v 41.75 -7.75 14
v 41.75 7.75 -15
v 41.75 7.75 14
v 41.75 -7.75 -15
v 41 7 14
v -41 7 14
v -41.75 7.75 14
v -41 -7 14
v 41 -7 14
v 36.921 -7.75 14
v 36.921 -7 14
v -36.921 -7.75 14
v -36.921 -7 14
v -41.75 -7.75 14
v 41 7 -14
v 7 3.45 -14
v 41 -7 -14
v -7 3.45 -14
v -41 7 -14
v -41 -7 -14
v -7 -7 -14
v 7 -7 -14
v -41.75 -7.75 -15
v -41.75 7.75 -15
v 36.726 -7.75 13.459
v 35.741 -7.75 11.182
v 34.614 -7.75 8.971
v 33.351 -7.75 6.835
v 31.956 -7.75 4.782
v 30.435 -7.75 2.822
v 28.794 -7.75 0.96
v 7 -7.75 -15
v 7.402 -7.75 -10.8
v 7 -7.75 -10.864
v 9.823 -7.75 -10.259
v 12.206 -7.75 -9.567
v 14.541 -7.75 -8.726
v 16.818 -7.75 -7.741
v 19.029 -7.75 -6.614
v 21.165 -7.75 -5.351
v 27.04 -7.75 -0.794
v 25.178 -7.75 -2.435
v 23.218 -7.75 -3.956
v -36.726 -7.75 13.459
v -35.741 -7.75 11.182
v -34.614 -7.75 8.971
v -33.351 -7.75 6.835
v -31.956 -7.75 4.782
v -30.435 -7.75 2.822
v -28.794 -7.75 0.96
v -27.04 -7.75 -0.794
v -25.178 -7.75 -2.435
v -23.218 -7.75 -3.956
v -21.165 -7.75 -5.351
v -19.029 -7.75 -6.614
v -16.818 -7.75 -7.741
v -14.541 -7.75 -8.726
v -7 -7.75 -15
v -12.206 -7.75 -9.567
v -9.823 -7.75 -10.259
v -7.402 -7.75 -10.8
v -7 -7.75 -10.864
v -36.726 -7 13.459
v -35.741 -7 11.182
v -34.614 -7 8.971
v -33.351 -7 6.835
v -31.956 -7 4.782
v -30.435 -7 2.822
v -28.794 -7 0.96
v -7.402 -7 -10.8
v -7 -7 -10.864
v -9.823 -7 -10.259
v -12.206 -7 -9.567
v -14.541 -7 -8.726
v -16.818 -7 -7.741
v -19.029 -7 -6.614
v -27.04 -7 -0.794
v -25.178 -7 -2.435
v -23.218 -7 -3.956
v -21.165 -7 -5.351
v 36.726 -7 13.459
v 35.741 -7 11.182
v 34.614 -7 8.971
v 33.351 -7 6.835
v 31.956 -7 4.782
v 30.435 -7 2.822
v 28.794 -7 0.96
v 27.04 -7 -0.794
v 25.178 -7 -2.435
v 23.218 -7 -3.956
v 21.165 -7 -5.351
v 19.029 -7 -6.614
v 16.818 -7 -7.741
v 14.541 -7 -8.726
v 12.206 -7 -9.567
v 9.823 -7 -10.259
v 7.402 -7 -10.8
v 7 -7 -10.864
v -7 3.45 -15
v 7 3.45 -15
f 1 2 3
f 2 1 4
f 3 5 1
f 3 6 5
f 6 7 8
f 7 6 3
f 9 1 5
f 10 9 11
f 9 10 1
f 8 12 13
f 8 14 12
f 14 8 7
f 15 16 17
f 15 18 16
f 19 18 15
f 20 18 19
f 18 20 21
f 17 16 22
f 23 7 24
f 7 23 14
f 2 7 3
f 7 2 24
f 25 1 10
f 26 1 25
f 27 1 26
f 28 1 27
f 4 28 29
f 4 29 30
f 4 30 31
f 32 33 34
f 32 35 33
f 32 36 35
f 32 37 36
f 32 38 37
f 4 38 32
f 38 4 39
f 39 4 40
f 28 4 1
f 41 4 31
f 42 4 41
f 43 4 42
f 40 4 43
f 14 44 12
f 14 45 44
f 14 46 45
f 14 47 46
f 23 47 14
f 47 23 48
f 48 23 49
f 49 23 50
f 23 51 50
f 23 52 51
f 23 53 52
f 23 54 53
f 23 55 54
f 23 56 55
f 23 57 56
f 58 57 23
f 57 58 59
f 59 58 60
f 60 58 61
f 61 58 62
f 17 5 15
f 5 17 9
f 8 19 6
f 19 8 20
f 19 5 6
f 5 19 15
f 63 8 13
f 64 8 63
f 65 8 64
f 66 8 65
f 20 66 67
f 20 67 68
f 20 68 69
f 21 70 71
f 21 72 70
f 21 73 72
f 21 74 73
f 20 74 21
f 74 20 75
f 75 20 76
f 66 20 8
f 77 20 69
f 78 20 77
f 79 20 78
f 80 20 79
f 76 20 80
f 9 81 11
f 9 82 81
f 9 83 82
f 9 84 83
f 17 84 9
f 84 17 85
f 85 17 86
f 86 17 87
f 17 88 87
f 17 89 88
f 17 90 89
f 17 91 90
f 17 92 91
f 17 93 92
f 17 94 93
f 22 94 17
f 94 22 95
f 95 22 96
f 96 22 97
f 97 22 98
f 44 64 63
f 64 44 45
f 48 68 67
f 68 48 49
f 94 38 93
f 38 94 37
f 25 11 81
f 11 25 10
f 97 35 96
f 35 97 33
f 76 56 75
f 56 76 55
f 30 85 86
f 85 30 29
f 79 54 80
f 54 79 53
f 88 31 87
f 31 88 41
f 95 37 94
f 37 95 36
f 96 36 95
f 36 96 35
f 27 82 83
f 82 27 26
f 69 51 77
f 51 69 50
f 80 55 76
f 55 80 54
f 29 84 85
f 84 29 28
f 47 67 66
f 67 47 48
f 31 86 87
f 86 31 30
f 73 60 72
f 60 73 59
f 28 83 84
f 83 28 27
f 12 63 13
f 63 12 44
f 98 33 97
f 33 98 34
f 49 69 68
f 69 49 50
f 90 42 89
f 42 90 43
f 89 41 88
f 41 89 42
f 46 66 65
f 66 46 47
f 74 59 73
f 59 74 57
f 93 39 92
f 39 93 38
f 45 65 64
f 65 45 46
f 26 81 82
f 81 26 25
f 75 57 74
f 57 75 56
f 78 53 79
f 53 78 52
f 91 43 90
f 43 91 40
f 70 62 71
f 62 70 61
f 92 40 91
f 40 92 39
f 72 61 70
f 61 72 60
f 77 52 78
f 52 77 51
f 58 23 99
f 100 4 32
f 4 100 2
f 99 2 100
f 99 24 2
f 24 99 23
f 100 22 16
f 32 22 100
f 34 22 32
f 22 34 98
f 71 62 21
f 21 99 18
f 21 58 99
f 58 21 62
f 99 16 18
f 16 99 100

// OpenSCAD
 
  phonewidth = 82;
  phonedepth = 14;
  hight = 28;
  thickness = 1.5;
  basethickness = 1;
  chargercut = 14;
  sides = 100;
  
difference(){

union(){
 difference(){   
     
 difference(){
 cube ([phonewidth+thickness, phonedepth+thickness, hight], center = true);     
 cube ([phonewidth, phonedepth, hight+1], center = true);   
 }
 
 
 
 translate([0,0,phonewidth/2-hight/2+1])
 rotate ([90,0,0]) 
 linear_extrude (1000) 
 circle (r= phonewidth/2-thickness,$fn=sides);
 }
 
 translate([0,0,-hight/2-basethickness/2])
 cube ([phonewidth+thickness, phonedepth+thickness, basethickness], center = true);
 }
 
 
 translate([0,-phonedepth/5 - thickness,-hight/2+0.5])
 cube([chargercut,phonedepth+thickness,hight*2], center=true);
 }
 
